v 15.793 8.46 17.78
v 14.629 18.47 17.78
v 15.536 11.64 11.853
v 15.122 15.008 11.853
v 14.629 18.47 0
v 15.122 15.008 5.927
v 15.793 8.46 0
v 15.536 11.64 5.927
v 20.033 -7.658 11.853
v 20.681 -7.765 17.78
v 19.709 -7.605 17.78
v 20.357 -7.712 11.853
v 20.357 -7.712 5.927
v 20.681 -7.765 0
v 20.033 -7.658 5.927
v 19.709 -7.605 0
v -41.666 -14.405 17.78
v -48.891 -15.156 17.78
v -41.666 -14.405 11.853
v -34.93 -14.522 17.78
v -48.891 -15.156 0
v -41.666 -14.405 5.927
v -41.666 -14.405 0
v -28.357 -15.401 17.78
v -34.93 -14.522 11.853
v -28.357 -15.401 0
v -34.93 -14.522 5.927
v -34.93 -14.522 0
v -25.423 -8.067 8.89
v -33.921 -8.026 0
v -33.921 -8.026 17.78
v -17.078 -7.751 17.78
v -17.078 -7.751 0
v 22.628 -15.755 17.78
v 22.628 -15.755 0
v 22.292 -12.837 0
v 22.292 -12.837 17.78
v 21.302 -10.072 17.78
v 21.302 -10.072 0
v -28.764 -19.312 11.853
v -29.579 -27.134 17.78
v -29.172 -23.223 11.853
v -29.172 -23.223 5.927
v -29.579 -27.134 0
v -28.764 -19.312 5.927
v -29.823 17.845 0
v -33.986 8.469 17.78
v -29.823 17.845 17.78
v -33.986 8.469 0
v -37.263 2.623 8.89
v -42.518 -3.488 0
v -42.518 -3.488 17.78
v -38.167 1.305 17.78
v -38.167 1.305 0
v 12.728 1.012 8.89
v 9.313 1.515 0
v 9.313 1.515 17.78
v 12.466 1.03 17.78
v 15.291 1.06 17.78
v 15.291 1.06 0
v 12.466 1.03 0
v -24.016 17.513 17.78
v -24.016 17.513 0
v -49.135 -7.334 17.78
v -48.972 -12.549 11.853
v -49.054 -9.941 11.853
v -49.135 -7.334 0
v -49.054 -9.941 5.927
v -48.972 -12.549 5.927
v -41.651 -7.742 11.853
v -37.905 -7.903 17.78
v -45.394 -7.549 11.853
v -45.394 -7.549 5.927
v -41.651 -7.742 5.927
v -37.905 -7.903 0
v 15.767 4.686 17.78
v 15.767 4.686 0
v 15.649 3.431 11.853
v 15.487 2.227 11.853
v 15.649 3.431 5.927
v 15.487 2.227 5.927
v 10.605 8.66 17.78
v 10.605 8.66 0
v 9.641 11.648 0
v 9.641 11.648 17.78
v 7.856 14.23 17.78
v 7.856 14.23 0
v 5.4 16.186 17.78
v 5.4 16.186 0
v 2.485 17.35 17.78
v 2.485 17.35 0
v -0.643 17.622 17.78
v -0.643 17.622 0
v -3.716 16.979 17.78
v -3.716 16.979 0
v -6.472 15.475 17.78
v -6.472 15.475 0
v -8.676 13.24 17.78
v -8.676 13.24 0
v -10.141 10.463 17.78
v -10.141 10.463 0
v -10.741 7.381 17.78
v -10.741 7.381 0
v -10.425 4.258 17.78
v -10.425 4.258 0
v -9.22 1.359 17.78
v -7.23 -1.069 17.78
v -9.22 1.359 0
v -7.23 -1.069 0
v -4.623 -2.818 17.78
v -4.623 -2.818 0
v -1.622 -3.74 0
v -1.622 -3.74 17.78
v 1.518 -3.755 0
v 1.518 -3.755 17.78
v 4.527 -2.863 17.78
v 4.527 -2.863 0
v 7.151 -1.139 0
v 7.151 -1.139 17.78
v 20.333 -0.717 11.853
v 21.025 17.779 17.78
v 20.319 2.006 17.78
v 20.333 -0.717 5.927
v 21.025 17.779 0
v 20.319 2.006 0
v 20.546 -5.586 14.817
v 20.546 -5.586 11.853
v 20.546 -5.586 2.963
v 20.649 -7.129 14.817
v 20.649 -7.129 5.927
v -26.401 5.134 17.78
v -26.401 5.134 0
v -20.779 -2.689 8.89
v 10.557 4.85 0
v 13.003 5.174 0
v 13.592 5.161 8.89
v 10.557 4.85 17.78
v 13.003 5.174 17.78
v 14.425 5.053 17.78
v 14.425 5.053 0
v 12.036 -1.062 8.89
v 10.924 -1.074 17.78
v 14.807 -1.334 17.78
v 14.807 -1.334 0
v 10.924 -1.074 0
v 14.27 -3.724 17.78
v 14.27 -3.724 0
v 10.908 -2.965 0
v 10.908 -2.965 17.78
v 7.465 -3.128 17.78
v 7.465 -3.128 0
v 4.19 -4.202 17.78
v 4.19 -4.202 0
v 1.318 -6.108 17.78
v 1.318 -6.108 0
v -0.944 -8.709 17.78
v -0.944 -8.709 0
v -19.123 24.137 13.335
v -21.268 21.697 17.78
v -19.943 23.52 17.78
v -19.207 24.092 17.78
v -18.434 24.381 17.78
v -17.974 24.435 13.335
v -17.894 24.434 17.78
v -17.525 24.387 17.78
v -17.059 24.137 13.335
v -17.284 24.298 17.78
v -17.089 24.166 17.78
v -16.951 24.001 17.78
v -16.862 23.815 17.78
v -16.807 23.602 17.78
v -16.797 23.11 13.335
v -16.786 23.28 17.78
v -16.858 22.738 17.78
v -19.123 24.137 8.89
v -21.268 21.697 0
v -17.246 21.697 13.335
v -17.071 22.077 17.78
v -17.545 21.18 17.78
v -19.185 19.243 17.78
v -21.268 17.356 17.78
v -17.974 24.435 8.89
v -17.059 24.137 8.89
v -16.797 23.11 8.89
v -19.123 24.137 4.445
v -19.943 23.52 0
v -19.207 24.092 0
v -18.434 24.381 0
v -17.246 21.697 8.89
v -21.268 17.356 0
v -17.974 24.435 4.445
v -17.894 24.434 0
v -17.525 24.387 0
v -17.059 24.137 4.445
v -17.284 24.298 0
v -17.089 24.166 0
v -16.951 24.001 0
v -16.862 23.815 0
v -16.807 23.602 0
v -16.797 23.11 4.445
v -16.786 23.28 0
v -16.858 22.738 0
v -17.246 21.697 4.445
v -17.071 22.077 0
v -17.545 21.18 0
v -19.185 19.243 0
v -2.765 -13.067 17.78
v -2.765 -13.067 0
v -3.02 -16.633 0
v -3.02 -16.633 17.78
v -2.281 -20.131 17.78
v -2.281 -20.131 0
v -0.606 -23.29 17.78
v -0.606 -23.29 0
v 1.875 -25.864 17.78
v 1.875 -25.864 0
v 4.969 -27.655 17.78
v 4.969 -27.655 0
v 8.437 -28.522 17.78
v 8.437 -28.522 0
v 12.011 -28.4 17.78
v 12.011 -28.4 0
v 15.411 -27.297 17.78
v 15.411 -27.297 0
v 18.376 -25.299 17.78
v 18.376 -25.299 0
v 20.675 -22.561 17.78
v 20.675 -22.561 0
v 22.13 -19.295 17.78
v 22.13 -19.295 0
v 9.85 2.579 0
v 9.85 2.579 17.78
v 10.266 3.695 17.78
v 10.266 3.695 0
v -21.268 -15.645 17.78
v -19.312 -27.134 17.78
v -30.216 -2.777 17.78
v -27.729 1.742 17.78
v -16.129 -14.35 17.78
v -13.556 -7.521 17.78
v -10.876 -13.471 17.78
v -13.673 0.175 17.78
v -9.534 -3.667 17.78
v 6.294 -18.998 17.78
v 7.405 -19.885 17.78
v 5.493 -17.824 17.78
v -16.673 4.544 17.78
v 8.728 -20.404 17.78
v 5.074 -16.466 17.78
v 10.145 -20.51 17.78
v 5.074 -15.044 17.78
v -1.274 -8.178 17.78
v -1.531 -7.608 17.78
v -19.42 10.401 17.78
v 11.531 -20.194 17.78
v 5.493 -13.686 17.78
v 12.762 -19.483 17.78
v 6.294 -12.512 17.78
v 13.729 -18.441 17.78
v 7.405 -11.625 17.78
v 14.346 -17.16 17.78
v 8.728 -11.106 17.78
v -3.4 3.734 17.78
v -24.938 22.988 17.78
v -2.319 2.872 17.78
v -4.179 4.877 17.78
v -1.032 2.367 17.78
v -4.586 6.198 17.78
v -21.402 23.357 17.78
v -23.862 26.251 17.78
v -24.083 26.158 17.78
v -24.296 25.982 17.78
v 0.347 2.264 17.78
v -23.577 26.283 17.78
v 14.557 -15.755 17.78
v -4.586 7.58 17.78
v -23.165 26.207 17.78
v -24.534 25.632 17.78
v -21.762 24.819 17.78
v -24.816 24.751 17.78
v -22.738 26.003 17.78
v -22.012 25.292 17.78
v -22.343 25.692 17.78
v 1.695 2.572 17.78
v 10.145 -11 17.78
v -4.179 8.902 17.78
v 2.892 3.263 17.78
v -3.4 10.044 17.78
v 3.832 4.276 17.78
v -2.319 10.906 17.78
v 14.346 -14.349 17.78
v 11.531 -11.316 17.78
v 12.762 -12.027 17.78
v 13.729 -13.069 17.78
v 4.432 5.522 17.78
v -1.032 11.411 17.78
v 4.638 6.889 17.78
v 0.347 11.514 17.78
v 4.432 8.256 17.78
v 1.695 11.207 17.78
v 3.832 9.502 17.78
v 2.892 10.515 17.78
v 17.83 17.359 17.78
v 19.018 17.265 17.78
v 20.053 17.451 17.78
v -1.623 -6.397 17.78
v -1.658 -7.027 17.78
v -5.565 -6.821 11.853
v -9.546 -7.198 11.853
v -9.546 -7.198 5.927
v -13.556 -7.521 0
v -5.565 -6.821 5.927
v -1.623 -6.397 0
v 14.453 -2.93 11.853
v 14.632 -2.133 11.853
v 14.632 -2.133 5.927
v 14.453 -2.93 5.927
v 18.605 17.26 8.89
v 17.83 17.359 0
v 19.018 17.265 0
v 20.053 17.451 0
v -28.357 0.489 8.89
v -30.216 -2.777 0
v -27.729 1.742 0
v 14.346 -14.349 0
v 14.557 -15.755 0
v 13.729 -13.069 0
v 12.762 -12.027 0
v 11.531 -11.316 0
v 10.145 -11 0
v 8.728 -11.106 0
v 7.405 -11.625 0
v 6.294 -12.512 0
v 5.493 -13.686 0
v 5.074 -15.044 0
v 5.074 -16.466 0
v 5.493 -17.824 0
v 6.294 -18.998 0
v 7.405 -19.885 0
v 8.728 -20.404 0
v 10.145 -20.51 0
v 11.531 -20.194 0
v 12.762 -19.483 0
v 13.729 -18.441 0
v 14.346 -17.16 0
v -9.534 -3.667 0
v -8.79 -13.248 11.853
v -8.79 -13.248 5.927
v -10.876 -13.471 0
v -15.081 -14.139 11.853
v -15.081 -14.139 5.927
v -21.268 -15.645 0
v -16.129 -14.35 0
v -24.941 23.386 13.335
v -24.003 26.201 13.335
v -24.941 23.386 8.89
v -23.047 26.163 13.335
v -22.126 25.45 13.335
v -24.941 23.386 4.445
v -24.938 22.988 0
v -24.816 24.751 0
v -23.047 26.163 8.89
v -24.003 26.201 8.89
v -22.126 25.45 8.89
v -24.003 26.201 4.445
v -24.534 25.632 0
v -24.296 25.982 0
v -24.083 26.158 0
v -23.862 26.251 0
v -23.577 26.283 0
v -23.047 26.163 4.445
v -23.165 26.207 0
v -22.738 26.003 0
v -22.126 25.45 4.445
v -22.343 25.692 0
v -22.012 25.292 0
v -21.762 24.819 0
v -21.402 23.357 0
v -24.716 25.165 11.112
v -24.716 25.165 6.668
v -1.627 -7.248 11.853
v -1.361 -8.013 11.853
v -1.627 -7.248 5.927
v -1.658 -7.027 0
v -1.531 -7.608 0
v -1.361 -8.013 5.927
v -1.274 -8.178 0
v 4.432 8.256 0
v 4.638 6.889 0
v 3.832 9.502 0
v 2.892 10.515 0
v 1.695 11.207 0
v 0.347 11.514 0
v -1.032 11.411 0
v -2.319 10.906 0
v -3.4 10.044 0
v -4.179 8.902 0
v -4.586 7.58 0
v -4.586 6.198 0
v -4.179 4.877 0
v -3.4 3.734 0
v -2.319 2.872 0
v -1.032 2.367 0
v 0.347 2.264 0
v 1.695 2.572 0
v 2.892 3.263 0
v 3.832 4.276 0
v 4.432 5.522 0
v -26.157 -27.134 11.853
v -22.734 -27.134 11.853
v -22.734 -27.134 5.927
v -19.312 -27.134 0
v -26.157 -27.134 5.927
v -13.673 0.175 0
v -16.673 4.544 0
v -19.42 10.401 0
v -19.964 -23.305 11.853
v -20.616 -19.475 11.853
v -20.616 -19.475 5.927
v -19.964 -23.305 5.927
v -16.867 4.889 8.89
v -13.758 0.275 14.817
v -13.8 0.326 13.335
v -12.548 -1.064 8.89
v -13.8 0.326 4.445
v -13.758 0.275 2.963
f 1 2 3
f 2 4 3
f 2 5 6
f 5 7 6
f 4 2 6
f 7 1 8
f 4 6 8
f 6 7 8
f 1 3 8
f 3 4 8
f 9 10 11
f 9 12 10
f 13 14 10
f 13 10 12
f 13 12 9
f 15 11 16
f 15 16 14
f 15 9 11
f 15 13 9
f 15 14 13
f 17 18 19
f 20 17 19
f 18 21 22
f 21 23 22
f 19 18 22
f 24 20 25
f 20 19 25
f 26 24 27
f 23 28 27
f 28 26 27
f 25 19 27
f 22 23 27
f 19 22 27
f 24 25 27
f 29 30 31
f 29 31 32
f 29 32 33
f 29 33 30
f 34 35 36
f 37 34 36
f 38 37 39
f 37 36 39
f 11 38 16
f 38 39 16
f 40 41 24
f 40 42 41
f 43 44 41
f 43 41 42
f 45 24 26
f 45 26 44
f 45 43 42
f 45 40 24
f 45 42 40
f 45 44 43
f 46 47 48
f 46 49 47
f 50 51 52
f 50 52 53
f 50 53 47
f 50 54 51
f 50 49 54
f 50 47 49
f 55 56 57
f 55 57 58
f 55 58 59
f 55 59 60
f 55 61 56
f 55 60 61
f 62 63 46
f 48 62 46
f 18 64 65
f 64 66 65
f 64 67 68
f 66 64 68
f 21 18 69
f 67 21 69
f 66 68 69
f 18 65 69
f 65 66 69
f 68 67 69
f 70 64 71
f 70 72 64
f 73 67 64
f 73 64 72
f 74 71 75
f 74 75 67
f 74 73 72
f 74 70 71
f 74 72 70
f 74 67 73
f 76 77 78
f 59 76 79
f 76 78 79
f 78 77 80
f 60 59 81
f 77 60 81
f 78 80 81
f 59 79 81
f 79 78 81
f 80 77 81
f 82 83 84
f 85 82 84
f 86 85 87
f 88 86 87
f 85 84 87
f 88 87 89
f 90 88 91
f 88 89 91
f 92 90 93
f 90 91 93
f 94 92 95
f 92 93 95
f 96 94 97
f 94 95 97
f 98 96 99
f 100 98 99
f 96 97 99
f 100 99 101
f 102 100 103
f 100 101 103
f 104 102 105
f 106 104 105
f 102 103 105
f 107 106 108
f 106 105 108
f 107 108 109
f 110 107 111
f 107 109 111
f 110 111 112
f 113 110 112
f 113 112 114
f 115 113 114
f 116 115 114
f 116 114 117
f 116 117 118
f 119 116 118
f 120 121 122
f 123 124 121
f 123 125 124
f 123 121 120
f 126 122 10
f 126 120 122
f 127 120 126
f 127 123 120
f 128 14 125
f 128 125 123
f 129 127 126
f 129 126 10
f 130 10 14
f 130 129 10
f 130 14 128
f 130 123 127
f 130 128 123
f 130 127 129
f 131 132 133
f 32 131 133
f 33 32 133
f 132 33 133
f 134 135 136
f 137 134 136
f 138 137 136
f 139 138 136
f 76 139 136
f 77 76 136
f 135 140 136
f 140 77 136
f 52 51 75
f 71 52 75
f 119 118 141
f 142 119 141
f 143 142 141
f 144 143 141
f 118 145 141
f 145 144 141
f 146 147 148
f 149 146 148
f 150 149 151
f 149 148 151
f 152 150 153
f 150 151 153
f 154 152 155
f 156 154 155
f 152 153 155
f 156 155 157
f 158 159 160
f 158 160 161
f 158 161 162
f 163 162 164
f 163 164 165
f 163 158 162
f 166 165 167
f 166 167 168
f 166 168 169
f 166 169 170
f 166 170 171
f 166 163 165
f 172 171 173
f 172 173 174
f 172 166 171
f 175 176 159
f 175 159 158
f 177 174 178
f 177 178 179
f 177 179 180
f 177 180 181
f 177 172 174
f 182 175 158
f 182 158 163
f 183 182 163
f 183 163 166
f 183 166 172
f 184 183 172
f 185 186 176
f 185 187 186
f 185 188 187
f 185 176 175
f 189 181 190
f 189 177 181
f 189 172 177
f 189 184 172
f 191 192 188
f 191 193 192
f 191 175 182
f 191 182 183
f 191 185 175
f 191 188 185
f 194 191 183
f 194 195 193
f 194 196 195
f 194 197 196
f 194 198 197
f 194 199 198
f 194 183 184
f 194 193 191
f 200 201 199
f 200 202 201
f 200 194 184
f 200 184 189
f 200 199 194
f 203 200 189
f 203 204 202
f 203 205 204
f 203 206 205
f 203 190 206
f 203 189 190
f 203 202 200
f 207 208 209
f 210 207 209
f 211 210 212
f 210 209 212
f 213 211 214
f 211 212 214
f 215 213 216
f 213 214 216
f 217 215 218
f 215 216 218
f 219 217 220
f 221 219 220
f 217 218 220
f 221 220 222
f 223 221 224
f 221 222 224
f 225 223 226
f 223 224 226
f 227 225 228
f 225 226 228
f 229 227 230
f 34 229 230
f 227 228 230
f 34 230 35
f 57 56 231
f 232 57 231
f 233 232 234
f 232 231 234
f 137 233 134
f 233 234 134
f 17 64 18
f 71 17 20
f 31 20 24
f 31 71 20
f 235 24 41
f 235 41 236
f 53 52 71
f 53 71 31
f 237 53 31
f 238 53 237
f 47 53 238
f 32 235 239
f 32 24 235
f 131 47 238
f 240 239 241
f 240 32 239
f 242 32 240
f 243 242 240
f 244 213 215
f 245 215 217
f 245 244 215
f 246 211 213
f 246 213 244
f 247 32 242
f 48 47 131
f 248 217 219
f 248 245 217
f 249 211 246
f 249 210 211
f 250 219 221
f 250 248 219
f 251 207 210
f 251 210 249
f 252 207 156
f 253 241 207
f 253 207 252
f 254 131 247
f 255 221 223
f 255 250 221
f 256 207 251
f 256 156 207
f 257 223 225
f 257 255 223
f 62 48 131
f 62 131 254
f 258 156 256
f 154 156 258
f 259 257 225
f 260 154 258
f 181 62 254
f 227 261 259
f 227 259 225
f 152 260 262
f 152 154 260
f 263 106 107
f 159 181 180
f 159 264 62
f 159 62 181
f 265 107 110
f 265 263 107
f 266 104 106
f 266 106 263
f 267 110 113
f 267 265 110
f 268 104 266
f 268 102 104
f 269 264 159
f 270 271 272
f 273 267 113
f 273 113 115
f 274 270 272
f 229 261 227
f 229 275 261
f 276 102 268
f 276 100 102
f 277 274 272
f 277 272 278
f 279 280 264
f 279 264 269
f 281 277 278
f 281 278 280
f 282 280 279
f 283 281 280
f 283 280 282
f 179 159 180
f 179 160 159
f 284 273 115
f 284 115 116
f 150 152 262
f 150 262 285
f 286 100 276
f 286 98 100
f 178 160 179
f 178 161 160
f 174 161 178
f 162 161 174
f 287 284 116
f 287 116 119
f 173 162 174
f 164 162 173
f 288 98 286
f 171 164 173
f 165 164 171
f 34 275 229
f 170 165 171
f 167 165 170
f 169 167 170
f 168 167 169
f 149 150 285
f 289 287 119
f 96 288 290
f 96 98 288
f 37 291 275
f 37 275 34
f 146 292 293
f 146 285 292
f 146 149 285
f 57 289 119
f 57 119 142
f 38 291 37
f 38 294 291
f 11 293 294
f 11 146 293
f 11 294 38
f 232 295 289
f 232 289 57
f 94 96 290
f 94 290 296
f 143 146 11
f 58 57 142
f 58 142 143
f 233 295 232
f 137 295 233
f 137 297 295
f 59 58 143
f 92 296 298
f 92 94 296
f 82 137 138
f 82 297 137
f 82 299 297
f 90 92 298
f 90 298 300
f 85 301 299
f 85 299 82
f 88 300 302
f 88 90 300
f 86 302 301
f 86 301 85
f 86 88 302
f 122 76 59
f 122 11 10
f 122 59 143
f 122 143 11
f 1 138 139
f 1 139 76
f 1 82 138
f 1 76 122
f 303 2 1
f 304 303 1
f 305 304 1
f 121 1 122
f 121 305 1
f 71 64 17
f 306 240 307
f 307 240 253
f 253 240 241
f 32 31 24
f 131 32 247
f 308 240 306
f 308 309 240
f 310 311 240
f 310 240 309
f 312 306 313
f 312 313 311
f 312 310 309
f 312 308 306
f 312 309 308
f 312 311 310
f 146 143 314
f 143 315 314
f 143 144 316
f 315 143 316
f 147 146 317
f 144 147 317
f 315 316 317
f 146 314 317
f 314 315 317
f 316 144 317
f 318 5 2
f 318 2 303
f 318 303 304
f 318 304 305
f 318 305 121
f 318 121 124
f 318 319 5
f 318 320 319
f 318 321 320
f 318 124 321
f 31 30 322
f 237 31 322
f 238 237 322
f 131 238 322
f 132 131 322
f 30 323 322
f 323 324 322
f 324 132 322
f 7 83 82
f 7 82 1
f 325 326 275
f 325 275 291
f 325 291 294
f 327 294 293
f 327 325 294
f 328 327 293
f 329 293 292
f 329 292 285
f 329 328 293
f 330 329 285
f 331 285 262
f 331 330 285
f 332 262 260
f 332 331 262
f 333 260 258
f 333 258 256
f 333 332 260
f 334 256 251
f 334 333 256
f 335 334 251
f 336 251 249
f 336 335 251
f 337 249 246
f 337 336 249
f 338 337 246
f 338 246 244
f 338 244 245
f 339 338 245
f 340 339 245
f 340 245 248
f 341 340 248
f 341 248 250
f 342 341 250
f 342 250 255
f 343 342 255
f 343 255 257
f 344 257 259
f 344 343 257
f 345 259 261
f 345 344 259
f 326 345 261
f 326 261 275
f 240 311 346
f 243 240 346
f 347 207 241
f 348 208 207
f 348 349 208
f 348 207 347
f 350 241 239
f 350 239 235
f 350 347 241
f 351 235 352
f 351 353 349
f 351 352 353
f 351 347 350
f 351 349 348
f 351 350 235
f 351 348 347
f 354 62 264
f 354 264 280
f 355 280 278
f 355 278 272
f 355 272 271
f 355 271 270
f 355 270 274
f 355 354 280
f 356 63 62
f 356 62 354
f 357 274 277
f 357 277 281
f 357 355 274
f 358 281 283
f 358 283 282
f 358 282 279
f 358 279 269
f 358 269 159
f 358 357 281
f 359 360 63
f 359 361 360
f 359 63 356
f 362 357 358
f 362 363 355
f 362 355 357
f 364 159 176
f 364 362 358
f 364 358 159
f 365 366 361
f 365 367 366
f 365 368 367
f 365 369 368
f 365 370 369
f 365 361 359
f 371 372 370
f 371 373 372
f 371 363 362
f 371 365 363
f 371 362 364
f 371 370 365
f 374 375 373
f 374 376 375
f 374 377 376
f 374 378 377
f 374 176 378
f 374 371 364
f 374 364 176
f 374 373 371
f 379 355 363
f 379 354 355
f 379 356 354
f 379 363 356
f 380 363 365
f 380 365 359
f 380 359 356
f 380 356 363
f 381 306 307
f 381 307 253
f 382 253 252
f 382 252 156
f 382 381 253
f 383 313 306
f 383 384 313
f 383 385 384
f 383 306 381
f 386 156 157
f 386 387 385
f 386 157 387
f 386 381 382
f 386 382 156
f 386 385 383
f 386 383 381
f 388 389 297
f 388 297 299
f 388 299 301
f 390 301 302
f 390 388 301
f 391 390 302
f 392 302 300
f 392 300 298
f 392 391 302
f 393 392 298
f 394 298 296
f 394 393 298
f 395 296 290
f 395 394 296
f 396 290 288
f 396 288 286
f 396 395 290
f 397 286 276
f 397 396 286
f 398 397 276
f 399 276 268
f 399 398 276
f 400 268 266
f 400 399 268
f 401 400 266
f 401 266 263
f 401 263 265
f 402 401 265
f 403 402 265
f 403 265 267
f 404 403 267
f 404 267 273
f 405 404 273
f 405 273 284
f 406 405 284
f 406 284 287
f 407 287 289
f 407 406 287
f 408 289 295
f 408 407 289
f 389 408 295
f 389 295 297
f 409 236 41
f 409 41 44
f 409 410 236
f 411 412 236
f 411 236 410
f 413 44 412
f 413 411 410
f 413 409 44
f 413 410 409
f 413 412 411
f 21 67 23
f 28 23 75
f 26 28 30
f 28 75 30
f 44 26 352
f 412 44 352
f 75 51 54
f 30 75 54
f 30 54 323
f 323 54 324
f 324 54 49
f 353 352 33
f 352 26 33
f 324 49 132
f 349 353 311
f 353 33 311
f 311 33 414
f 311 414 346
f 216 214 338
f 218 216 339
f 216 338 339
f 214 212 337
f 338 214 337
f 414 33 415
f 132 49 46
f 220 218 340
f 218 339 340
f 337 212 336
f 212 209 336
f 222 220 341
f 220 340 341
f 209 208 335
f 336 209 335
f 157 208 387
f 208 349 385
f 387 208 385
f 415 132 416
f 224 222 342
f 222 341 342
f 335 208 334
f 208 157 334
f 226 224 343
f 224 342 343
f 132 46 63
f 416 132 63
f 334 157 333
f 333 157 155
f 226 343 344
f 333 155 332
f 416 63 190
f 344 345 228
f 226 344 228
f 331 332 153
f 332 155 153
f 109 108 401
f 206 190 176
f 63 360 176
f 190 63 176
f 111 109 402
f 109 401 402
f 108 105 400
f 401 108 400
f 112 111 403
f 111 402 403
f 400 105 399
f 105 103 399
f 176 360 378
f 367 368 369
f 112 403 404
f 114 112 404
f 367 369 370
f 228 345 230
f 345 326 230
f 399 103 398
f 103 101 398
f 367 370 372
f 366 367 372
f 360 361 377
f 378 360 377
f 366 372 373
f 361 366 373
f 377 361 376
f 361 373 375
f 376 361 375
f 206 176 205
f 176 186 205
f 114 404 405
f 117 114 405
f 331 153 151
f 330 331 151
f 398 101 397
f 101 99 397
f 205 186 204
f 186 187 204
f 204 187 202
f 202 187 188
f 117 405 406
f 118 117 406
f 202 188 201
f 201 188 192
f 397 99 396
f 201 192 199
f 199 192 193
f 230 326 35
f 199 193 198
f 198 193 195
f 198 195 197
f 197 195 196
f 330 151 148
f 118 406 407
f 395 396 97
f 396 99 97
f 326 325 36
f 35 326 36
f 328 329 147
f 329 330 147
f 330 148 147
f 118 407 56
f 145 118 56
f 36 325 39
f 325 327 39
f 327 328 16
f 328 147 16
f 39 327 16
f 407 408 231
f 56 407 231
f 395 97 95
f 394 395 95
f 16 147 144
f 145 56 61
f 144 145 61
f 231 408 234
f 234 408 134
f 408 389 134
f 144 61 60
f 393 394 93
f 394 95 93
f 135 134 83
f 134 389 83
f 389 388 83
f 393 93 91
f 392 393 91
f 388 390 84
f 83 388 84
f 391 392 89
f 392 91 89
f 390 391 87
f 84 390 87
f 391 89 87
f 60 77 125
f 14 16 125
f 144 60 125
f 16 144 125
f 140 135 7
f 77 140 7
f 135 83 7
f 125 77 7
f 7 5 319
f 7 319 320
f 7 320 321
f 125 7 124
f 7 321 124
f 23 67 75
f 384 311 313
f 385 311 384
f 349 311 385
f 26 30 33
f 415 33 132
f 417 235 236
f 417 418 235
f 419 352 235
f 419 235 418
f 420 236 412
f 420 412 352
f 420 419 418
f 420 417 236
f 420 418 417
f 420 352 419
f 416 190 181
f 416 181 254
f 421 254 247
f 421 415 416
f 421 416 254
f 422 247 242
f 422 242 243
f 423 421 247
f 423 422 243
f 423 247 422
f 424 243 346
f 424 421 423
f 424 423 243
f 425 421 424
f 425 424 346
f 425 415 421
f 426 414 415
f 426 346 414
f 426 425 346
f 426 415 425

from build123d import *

# Parameters (mm, degrees)
F0_R     = 4.638201324
F0_R_2   = 4.768433274
F1_DEPTH = 17.78


with BuildPart() as f1:
    # F0 (on Top) → F1 (new body)
    with BuildSketch(Plane.XY):
        with BuildLine():
            Line((-35.690382123, -10.0226411596), (-37.9054210512, -7.9028624289))
            add(Edge.make_bspline(
                [(-49.1353943944, -7.3336390778), (-45.393796035, -7.5559354852), (-41.6535417498, -7.7618397531), (-37.9054210512, -7.9028624289)],
                knots=[0, 0, 0, 0, 0.2370343759, 0.2370343759, 0.2370343759, 0.2370343759], degree=3))
            add(Edge.make_bspline(
                [(-49.1353943944, -7.3336390778), (-49.0539086362, -9.9411560223), (-48.9724228779, -12.5486729667), (-48.8909371197, -15.1561899111)],
                knots=[0, 0, 0, 0, 7.8263695861, 7.8263695861, 7.8263695861, 7.8263695861], degree=3))
            add(Edge.make_bspline(
                [(-48.8909371197, -15.1561899111), (-41.3128435612, -13.9339165762), (-34.9570214748, -14.1783701256), (-28.3567421138, -15.4006434605)],
                knots=[0, 0, 0, 0, 20.5356500281, 20.5356500281, 20.5356500281, 20.5356500281], degree=3))
            add(Edge.make_bspline(
                [(-29.5790154487, -27.1344725043), (-29.1715910037, -23.2231961563), (-28.7641665588, -19.3119198084), (-28.3567421138, -15.4006434605)],
                knots=[0, 0, 0, 0, 11.7973173279, 11.7973173279, 11.7973173279, 11.7973173279], degree=3))
            add(Edge.make_bspline(
                [(-19.3119179457, -27.1344725043), (-22.7342837801, -27.1344725043), (-26.1566496144, -27.1344725043), (-29.5790154487, -27.1344725043)],
                knots=[0, 0, 0, 0, 10.2670975029, 10.2670975029, 10.2670975029, 10.2670975029], degree=3))
            add(Edge.make_bspline(
                [(-21.267555654, -15.6450998038), (-20.6156764179, -19.474890704), (-19.9637971818, -23.3046816041), (-19.3119179457, -27.1344725043)],
                knots=[0, 0, 0, 0, 11.6546215681, 11.6546215681, 11.6546215681, 11.6546215681], degree=3))
            add(Edge.make_bspline(
                [(-2.7650330181, -13.0668785919), (-8.5340574192, -12.8617801096), (-15.2554069707, -13.8637216306), (-21.267555654, -15.6450998038)],
                knots=[1.8105537506, 1.8105537506, 1.8105537506, 1.8105537506, 20.3189452298, 20.3189452298, 20.3189452298, 20.3189452298], degree=3))
            ThreePointArc((-2.7650330181, -13.0668785919), (-2.0563968643, -10.8035826328), (-0.9435463791, -8.7092479903))
            add(Edge.make_bspline(
                [(-1.6231150366, -6.3969809562), (-1.8030889288, -7.2967995468), (-1.3953773544, -8.0411328403), (-0.9435463791, -8.7092479903)],
                knots=[0, 0, 0, 0, 0.2771530707, 0.2771530707, 0.2771530707, 0.2771530707], degree=3))
            add(Edge.make_bspline(
                [(-13.5555072823, -7.5210221014), (-9.5350379246, -7.2288478921), (-5.5414650595, -6.8409241797), (-1.6231150366, -6.3969809562)],
                knots=[0.7472805778, 0.7472805778, 0.7472805778, 0.7472805778, 1, 1, 1, 1], degree=3))
            Line((-13.5555072823, -7.5210221014), (-15.4006425291, -9.2892767861))
            add(Edge.make_bspline(
                [(-17.0783166, -7.7512084016), (-16.5569761885, -8.325515744), (-16.003912907, -8.846409664), (-15.4006425291, -9.2892767861)],
                knots=[0.8641525735, 0.8641525735, 0.8641525735, 0.8641525735, 1, 1, 1, 1], degree=3))
            add(Edge.make_bspline(
                [(-33.9211031494, -8.0260959373), (-31.0961036625, -8.0930586948), (-25.4976173365, -8.1336326117), (-19.8591672797, -7.9118738805), (-17.0783166, -7.7512084016)],
                knots=[0.320953967, 0.320953967, 0.320953967, 0.320953967, 0.499289411, 0.6735867607, 0.6735867607, 0.6735867607, 0.6735867607], degree=3))
            add(Edge.make_bspline(
                [(-35.690382123, -10.0226411596), (-35.0805947329, -9.3907110584), (-34.4893601895, -8.7194097618), (-33.9211031657, -8.0260959105)],
                knots=[0, 0, 0, 0, 0.1195210098, 0.1195210098, 0.1195210098, 0.1195210098], degree=3))
        make_face()
        with BuildLine():
            Line((-15.4006425291, -9.2892767861), (-13.5555072823, -7.5210221014))
            add(Edge.make_bspline(
                [(-17.0783166, -7.7512084016), (-15.9025586107, -7.6832782096), (-14.7278894087, -7.6062210645), (-13.5555072823, -7.5210221014)],
                knots=[0.6735867607, 0.6735867607, 0.6735867607, 0.6735867607, 0.7472805778, 0.7472805778, 0.7472805778, 0.7472805778], degree=3))
            add(Edge.make_bspline(
                [(-17.0783166, -7.7512084016), (-16.5569761885, -8.325515744), (-16.003912907, -8.846409664), (-15.4006425291, -9.2892767861)],
                knots=[0.8641525735, 0.8641525735, 0.8641525735, 0.8641525735, 1, 1, 1, 1], degree=3))
        make_face()
        with BuildLine():
            add(Edge.make_bspline(
                [(-37.9054210512, -7.9028624289), (-36.5784373368, -7.9527900617), (-35.2504676135, -7.9945851669), (-33.9211031494, -8.0260959373)],
                knots=[0.2370343759, 0.2370343759, 0.2370343759, 0.2370343759, 0.320953967, 0.320953967, 0.320953967, 0.320953967], degree=3))
            Line((-37.9054210512, -7.9028624289), (-35.690382123, -10.0226411596))
            add(Edge.make_bspline(
                [(-35.690382123, -10.0226411596), (-35.0805947329, -9.3907110584), (-34.4893601895, -8.7194097618), (-33.9211031657, -8.0260959105)],
                knots=[0, 0, 0, 0, 0.1195210098, 0.1195210098, 0.1195210098, 0.1195210098], degree=3))
        make_face()
        with BuildLine():
            Line((-24.0164042954, 17.5133645994), (-29.8234708607, 17.8451966494))
            add(Edge.make_bspline(
                [(-42.5184816122, -3.4881916363), (-40.4406152666, -1.5325543936), (-36.729273016, 2.3855655582), (-32.1297128798, 12.0471876965), (-29.8234708607, 17.8451966494)],
                knots=[0, 0, 0, 0, 0.4081963101, 1, 1, 1, 1], degree=3))
            Line((-42.5184816122, -3.4881916363), (-37.9054210512, -7.9028624289))
            add(Edge.make_bspline(
                [(-37.9054210512, -7.9028624289), (-36.5784373368, -7.9527900617), (-35.2504676135, -7.9945851669), (-33.9211031494, -8.0260959373)],
                knots=[0.2370343759, 0.2370343759, 0.2370343759, 0.2370343759, 0.320953967, 0.320953967, 0.320953967, 0.320953967], degree=3))
            add(Edge.make_bspline(
                [(-33.9211031657, -8.0260959105), (-31.5672329793, -5.1542074231), (-28.082194505, 0.6249600809), (-26.8387619268, 3.6965800844), (-26.4011044055, 5.1335520111)],
                knots=[0.1195210098, 0.1195210098, 0.1195210098, 0.1195210098, 0.6146084964, 1, 1, 1, 1], degree=3))
            add(Edge.make_bspline(
                [(-26.4011044055, 5.1335520111), (-24.6495971424, 2.3786851346), (-21.2149243812, -1.7515205069), (-18.4165740511, -6.2769872146), (-17.0783166, -7.7512084016)],
                knots=[0, 0, 0, 0, 0.5154383232, 0.8641525735, 0.8641525735, 0.8641525735, 0.8641525735], degree=3))
            add(Edge.make_bspline(
                [(-17.0783166, -7.7512084016), (-15.9025586107, -7.6832782096), (-14.7278894087, -7.6062210645), (-13.5555072823, -7.5210221014)],
                knots=[0.6735867607, 0.6735867607, 0.6735867607, 0.6735867607, 0.7472805778, 0.7472805778, 0.7472805778, 0.7472805778], degree=3))
            Line((-13.5555072823, -7.5210221014), (-9.5337294042, -3.6668181419))
            add(Edge.make_bspline(
                [(-21.267555654, 17.356287688), (-20.4427144862, 12.4498118331), (-17.3415208773, 4.6835203337), (-12.9444424563, -1.1756693571), (-9.5337294042, -3.6668181419)],
                knots=[0, 0, 0, 0, 0.5199595505, 1, 1, 1, 1], degree=3))
            Line((-21.267555654, 17.356287688), (-24.0164042954, 17.5133645994))
        make_face()
        with BuildLine():
            ThreePointArc((10.604998152, 8.6600199708), (-10.1405410565, 10.4628466512), (7.1514655816, -1.1394844732))
            ThreePointArc((7.1514655816, -1.1394844732), (8.3383309599, 0.1013219698), (9.3125402076, 1.5152407782))
            ThreePointArc((9.3125402076, 1.5152407782), (10.0736550874, 3.1309986037), (10.5567934998, 4.8504597068))
            ThreePointArc((10.5567934998, 4.8504597068), (10.7029668443, 5.8651384426), (10.7518393927, 6.8891262636))
            ThreePointArc((10.7518393927, 6.8891262636), (10.7150661971, 7.7776118955), (10.604998152, 8.6600199708))
        make_face()
        with Locations((0, 6.8891262636)):
            Circle(F0_R, mode=Mode.SUBTRACT)
        with BuildLine():
            add(Edge.make_bspline(
                [(10.604998152, 8.6600199708), (12.2122220903, 8.5395076784), (14.1003505816, 8.4214401451), (15.5337995939, 8.4505866978), (15.7929722283, 8.4600677202)],
                knots=[0.1510598542, 0.1510598542, 0.1510598542, 0.1510598542, 0.5892870456, 0.6916412836, 0.6916412836, 0.6916412836, 0.6916412836], degree=3))
            ThreePointArc((10.604998152, 8.6600199708), (10.7150661971, 7.7776118955), (10.7518393927, 6.8891262636))
            ThreePointArc((10.7518393927, 6.8891262636), (10.7029668443, 5.8651384426), (10.5567934998, 4.8504597068))
            add(Edge.make_bspline(
                [(10.5567934998, 4.8504597068), (11.6077335714, 5.0731284108), (13.4512603245, 5.3429270555), (15.0687675601, 4.9259274744), (15.7667668859, 4.6856378648)],
                knots=[0.1791229698, 0.1791229698, 0.1791229698, 0.1791229698, 0.5278379059, 0.8050076356, 0.8050076356, 0.8050076356, 0.8050076356], degree=3))
            add(Edge.make_bspline(
                [(15.7929722281, 8.4600677202), (15.8259646398, 7.8000186591), (15.8597235494, 6.4911320302), (15.8097527542, 5.2825685096), (15.766766877, 4.6856378506)],
                knots=[0.3300900765, 0.3300900765, 0.3300900765, 0.3300900765, 0.4014111421, 0.475881609, 0.475881609, 0.475881609, 0.475881609], degree=3))
        make_face()
        with BuildLine():
            add(Edge.make_bspline(
                [(-0.9435463791, -8.7092479903), (-0.4831654467, -9.3900058236), (0.812507327, -10.9299793578), (-1.3591535196, -12.500896209), (-1.1008912697, -13.1621211767)],
                knots=[0.2771530707, 0.2771530707, 0.2771530707, 0.2771530707, 0.5595506841, 1, 1, 1, 1], degree=3))
            ThreePointArc((-0.9435463791, -8.7092479903), (-2.0563968643, -10.8035826328), (-2.7650330181, -13.0668785919))
            add(Edge.make_bspline(
                [(-1.1008912697, -13.1621211767), (-1.6454550718, -13.1185561223), (-2.2006874466, -13.0869420224), (-2.7650330181, -13.0668785919)],
                knots=[0, 0, 0, 0, 1.8105537506, 1.8105537506, 1.8105537506, 1.8105537506], degree=3))
        make_face()
        with BuildLine():
            ThreePointArc((14.2704683408, -3.7238992918), (5.7912004506, -3.554656622), (-0.9435463791, -8.7092479903))
            add(Edge.make_bspline(
                [(-0.9435463791, -8.7092479903), (-0.4831654467, -9.3900058236), (0.812507327, -10.9299793578), (-1.3591535196, -12.500896209), (-1.1008912697, -13.1621211767)],
                knots=[0.2771530707, 0.2771530707, 0.2771530707, 0.2771530707, 0.5595506841, 1, 1, 1, 1], degree=3))
            add(Edge.make_bspline(
                [(-1.1008912697, -13.1621211767), (-1.6454550718, -13.1185561223), (-2.2006874466, -13.0869420224), (-2.7650330181, -13.0668785919)],
                knots=[0, 0, 0, 0, 1.8105537506, 1.8105537506, 1.8105537506, 1.8105537506], degree=3))
            ThreePointArc((-2.7650330181, -13.0668785919), (8.4374624091, -28.5222208777), (22.6276149154, -15.7549548894))
            ThreePointArc((22.6276149154, -15.7549548894), (21.8759455138, -11.4264718648), (19.7089541791, -7.6048333761))
            add(Edge.make_bspline(
                [(19.7089541791, -7.6048333761), (17.6699139236, -7.2677585051), (15.6308736681, -6.9306836341), (13.5918334126, -6.5936087631)],
                knots=[0.9850731992, 0.9850731992, 0.9850731992, 0.9850731992, 7.1852136564, 7.1852136564, 7.1852136564, 7.1852136564], degree=3))
            add(Edge.make_bspline(
                [(14.2704683408, -3.7238992918), (14.0481607533, -4.6828199189), (13.819997083, -5.638214341), (13.5918334126, -6.5936087631)],
                knots=[0.862431978, 0.862431978, 0.862431978, 0.862431978, 1, 1, 1, 1], degree=3))
        make_face()
        with Locations((9.7890105098, -15.7549548894)):
            Circle(F0_R_2, mode=Mode.SUBTRACT)
        with BuildLine():
            ThreePointArc((19.7089541791, -7.6048333761), (17.2465907899, -5.3043922515), (14.2704683408, -3.7238992918))
            add(Edge.make_bspline(
                [(14.2704683408, -3.7238992918), (14.0481607533, -4.6828199189), (13.819997083, -5.638214341), (13.5918334126, -6.5936087631)],
                knots=[0.862431978, 0.862431978, 0.862431978, 0.862431978, 1, 1, 1, 1], degree=3))
            add(Edge.make_bspline(
                [(19.7089541791, -7.6048333761), (17.6699139236, -7.2677585051), (15.6308736681, -6.9306836341), (13.5918334126, -6.5936087631)],
                knots=[0.9850731992, 0.9850731992, 0.9850731992, 0.9850731992, 7.1852136564, 7.1852136564, 7.1852136564, 7.1852136564], degree=3))
        make_face()
        with BuildLine():
            add(Edge.make_bspline(
                [(14.8069814342, -1.3342170053), (14.6343654147, -2.1345241136), (14.4544217387, -2.9304189177), (14.2704683408, -3.7238992918)],
                knots=[0.7485982336, 0.7485982336, 0.7485982336, 0.7485982336, 0.862431978, 0.862431978, 0.862431978, 0.862431978], degree=3))
            ThreePointArc((14.2704683408, -3.7238992918), (17.2465907899, -5.3043922515), (19.7089541791, -7.6048333761))
            add(Edge.make_bspline(
                [(20.6805605656, -7.7654501645), (20.3566917701, -7.7119112351), (20.0328229746, -7.6583723056), (19.7089541791, -7.6048333761)],
                knots=[0.0002804682, 0.0002804682, 0.0002804682, 0.0002804682, 0.9850731992, 0.9850731992, 0.9850731992, 0.9850731992], degree=3))
            add(Edge.make_bspline(
                [(21.0246238858, 17.7790299058), (20.6250946927, 11.2667740848), (19.9812190211, 0.7717134879), (20.6821235466, -7.3379998329), (20.6814771583, -7.7354147295), (20.6805605822, -7.7654501629)],
                knots=[0, 0, 0, 0, 0.5854026775, 0.9434267853, 0.982045861, 0.982045861, 0.982045861, 0.982045861], degree=3))
            add(Edge.make_bspline(
                [(14.6289672703, 18.4704512358), (16.0331969379, 17.8900841317), (18.5210907303, 16.8618394301), (20.265014458, 17.5007405886), (21.0246238858, 17.7790299058)],
                knots=[0, 0, 0, 0, 0.5644250859, 1, 1, 1, 1], degree=3))
            add(Edge.make_bspline(
                [(14.6289672703, 18.4704512358), (15.134621565, 14.9926878976), (15.6402758597, 11.5149245593), (15.7929722281, 8.4600677202)],
                knots=[0, 0, 0, 0, 0.3300900765, 0.3300900765, 0.3300900765, 0.3300900765], degree=3))
            add(Edge.make_bspline(
                [(15.7929722281, 8.4600677202), (15.8259646398, 7.8000186591), (15.8597235494, 6.4911320302), (15.8097527542, 5.2825685096), (15.766766877, 4.6856378506)],
                knots=[0.3300900765, 0.3300900765, 0.3300900765, 0.3300900765, 0.4014111421, 0.475881609, 0.475881609, 0.475881609, 0.475881609], degree=3))
            add(Edge.make_bspline(
                [(15.766766877, 4.6856378506), (15.6743085756, 3.4017000011), (15.5010704409, 2.2121624994), (15.2906951215, 1.0595967053)],
                knots=[0.475881609, 0.475881609, 0.475881609, 0.475881609, 0.6360600981, 0.6360600981, 0.6360600981, 0.6360600981], degree=3))
            add(Edge.make_bspline(
                [(15.2906951215, 1.0595967053), (15.1920245831, 0.5190186192), (15.0319815527, -0.2785674737), (14.8637109723, -1.0711993969), (14.8069814342, -1.3342170053)],
                knots=[0.6360600981, 0.6360600981, 0.6360600981, 0.6360600981, 0.7111872462, 0.7485982336, 0.7485982336, 0.7485982336, 0.7485982336], degree=3))
        make_face()
        with BuildLine():
            add(Edge.make_bspline(
                [(7.1514655816, -1.1394844732), (8.7499595944, -1.2802845456), (11.2636613372, -0.8875201197), (13.8928422624, -1.1887215989), (14.8069814342, -1.3342170053)],
                knots=[0, 0, 0, 0, 0.4956008854, 0.7694205432, 0.7694205432, 0.7694205432, 0.7694205432], degree=3))
            add(Edge.make_bspline(
                [(15.2906951215, 1.0595967053), (15.1920245831, 0.5190186192), (15.0319815527, -0.2785674737), (14.8637109723, -1.0711993969), (14.8069814342, -1.3342170053)],
                knots=[0.6360600981, 0.6360600981, 0.6360600981, 0.6360600981, 0.7111872462, 0.7485982336, 0.7485982336, 0.7485982336, 0.7485982336], degree=3))
            add(Edge.make_bspline(
                [(9.3125402076, 1.5152407782), (10.4624087708, 1.281373109), (12.4919261066, 0.9184224008), (14.4446622318, 0.995868069), (15.2906951195, 1.0595967062)],
                knots=[0.106445154, 0.106445154, 0.106445154, 0.106445154, 0.5118822744, 0.8252169792, 0.8252169792, 0.8252169792, 0.8252169792], degree=3))
            ThreePointArc((9.3125402076, 1.5152407782), (8.3383309599, 0.1013219698), (7.1514655816, -1.1394844732))
        make_face()
        with BuildLine():
            add(Edge.make_bspline(
                [(-24.0164042954, 17.5133645994), (-24.4885457329, 19.5307599279), (-25.2942491008, 22.9734194385), (-24.4531740639, 26.8912323127), (-21.4906827533, 25.5982225664), (-21.3494508123, 23.1289222724), (-21.267555654, 21.6970667243)],
                knots=[0, 0, 0, 0, 0.3231709152, 0.5514870631, 0.7399240025, 1, 1, 1, 1], degree=3))
            Line((-24.0164042954, 17.5133645994), (-21.267555654, 17.356287688))
            add(Edge.make_bspline(
                [(-21.267555654, 21.6970667243), (-20.6525906878, 22.6822724684), (-19.5473692987, 24.4528944076), (-16.4737011929, 24.6074750909), (-16.9738421891, 21.0966583386), (-19.6430357601, 18.7714511781), (-21.267555654, 17.356287688)],
                knots=[0, 0, 0, 0, 0.2490762174, 0.4476423506, 0.6638250595, 1, 1, 1, 1], degree=3))
        make_face()
    extrude(amount=F1_DEPTH)


solid = f1.part
